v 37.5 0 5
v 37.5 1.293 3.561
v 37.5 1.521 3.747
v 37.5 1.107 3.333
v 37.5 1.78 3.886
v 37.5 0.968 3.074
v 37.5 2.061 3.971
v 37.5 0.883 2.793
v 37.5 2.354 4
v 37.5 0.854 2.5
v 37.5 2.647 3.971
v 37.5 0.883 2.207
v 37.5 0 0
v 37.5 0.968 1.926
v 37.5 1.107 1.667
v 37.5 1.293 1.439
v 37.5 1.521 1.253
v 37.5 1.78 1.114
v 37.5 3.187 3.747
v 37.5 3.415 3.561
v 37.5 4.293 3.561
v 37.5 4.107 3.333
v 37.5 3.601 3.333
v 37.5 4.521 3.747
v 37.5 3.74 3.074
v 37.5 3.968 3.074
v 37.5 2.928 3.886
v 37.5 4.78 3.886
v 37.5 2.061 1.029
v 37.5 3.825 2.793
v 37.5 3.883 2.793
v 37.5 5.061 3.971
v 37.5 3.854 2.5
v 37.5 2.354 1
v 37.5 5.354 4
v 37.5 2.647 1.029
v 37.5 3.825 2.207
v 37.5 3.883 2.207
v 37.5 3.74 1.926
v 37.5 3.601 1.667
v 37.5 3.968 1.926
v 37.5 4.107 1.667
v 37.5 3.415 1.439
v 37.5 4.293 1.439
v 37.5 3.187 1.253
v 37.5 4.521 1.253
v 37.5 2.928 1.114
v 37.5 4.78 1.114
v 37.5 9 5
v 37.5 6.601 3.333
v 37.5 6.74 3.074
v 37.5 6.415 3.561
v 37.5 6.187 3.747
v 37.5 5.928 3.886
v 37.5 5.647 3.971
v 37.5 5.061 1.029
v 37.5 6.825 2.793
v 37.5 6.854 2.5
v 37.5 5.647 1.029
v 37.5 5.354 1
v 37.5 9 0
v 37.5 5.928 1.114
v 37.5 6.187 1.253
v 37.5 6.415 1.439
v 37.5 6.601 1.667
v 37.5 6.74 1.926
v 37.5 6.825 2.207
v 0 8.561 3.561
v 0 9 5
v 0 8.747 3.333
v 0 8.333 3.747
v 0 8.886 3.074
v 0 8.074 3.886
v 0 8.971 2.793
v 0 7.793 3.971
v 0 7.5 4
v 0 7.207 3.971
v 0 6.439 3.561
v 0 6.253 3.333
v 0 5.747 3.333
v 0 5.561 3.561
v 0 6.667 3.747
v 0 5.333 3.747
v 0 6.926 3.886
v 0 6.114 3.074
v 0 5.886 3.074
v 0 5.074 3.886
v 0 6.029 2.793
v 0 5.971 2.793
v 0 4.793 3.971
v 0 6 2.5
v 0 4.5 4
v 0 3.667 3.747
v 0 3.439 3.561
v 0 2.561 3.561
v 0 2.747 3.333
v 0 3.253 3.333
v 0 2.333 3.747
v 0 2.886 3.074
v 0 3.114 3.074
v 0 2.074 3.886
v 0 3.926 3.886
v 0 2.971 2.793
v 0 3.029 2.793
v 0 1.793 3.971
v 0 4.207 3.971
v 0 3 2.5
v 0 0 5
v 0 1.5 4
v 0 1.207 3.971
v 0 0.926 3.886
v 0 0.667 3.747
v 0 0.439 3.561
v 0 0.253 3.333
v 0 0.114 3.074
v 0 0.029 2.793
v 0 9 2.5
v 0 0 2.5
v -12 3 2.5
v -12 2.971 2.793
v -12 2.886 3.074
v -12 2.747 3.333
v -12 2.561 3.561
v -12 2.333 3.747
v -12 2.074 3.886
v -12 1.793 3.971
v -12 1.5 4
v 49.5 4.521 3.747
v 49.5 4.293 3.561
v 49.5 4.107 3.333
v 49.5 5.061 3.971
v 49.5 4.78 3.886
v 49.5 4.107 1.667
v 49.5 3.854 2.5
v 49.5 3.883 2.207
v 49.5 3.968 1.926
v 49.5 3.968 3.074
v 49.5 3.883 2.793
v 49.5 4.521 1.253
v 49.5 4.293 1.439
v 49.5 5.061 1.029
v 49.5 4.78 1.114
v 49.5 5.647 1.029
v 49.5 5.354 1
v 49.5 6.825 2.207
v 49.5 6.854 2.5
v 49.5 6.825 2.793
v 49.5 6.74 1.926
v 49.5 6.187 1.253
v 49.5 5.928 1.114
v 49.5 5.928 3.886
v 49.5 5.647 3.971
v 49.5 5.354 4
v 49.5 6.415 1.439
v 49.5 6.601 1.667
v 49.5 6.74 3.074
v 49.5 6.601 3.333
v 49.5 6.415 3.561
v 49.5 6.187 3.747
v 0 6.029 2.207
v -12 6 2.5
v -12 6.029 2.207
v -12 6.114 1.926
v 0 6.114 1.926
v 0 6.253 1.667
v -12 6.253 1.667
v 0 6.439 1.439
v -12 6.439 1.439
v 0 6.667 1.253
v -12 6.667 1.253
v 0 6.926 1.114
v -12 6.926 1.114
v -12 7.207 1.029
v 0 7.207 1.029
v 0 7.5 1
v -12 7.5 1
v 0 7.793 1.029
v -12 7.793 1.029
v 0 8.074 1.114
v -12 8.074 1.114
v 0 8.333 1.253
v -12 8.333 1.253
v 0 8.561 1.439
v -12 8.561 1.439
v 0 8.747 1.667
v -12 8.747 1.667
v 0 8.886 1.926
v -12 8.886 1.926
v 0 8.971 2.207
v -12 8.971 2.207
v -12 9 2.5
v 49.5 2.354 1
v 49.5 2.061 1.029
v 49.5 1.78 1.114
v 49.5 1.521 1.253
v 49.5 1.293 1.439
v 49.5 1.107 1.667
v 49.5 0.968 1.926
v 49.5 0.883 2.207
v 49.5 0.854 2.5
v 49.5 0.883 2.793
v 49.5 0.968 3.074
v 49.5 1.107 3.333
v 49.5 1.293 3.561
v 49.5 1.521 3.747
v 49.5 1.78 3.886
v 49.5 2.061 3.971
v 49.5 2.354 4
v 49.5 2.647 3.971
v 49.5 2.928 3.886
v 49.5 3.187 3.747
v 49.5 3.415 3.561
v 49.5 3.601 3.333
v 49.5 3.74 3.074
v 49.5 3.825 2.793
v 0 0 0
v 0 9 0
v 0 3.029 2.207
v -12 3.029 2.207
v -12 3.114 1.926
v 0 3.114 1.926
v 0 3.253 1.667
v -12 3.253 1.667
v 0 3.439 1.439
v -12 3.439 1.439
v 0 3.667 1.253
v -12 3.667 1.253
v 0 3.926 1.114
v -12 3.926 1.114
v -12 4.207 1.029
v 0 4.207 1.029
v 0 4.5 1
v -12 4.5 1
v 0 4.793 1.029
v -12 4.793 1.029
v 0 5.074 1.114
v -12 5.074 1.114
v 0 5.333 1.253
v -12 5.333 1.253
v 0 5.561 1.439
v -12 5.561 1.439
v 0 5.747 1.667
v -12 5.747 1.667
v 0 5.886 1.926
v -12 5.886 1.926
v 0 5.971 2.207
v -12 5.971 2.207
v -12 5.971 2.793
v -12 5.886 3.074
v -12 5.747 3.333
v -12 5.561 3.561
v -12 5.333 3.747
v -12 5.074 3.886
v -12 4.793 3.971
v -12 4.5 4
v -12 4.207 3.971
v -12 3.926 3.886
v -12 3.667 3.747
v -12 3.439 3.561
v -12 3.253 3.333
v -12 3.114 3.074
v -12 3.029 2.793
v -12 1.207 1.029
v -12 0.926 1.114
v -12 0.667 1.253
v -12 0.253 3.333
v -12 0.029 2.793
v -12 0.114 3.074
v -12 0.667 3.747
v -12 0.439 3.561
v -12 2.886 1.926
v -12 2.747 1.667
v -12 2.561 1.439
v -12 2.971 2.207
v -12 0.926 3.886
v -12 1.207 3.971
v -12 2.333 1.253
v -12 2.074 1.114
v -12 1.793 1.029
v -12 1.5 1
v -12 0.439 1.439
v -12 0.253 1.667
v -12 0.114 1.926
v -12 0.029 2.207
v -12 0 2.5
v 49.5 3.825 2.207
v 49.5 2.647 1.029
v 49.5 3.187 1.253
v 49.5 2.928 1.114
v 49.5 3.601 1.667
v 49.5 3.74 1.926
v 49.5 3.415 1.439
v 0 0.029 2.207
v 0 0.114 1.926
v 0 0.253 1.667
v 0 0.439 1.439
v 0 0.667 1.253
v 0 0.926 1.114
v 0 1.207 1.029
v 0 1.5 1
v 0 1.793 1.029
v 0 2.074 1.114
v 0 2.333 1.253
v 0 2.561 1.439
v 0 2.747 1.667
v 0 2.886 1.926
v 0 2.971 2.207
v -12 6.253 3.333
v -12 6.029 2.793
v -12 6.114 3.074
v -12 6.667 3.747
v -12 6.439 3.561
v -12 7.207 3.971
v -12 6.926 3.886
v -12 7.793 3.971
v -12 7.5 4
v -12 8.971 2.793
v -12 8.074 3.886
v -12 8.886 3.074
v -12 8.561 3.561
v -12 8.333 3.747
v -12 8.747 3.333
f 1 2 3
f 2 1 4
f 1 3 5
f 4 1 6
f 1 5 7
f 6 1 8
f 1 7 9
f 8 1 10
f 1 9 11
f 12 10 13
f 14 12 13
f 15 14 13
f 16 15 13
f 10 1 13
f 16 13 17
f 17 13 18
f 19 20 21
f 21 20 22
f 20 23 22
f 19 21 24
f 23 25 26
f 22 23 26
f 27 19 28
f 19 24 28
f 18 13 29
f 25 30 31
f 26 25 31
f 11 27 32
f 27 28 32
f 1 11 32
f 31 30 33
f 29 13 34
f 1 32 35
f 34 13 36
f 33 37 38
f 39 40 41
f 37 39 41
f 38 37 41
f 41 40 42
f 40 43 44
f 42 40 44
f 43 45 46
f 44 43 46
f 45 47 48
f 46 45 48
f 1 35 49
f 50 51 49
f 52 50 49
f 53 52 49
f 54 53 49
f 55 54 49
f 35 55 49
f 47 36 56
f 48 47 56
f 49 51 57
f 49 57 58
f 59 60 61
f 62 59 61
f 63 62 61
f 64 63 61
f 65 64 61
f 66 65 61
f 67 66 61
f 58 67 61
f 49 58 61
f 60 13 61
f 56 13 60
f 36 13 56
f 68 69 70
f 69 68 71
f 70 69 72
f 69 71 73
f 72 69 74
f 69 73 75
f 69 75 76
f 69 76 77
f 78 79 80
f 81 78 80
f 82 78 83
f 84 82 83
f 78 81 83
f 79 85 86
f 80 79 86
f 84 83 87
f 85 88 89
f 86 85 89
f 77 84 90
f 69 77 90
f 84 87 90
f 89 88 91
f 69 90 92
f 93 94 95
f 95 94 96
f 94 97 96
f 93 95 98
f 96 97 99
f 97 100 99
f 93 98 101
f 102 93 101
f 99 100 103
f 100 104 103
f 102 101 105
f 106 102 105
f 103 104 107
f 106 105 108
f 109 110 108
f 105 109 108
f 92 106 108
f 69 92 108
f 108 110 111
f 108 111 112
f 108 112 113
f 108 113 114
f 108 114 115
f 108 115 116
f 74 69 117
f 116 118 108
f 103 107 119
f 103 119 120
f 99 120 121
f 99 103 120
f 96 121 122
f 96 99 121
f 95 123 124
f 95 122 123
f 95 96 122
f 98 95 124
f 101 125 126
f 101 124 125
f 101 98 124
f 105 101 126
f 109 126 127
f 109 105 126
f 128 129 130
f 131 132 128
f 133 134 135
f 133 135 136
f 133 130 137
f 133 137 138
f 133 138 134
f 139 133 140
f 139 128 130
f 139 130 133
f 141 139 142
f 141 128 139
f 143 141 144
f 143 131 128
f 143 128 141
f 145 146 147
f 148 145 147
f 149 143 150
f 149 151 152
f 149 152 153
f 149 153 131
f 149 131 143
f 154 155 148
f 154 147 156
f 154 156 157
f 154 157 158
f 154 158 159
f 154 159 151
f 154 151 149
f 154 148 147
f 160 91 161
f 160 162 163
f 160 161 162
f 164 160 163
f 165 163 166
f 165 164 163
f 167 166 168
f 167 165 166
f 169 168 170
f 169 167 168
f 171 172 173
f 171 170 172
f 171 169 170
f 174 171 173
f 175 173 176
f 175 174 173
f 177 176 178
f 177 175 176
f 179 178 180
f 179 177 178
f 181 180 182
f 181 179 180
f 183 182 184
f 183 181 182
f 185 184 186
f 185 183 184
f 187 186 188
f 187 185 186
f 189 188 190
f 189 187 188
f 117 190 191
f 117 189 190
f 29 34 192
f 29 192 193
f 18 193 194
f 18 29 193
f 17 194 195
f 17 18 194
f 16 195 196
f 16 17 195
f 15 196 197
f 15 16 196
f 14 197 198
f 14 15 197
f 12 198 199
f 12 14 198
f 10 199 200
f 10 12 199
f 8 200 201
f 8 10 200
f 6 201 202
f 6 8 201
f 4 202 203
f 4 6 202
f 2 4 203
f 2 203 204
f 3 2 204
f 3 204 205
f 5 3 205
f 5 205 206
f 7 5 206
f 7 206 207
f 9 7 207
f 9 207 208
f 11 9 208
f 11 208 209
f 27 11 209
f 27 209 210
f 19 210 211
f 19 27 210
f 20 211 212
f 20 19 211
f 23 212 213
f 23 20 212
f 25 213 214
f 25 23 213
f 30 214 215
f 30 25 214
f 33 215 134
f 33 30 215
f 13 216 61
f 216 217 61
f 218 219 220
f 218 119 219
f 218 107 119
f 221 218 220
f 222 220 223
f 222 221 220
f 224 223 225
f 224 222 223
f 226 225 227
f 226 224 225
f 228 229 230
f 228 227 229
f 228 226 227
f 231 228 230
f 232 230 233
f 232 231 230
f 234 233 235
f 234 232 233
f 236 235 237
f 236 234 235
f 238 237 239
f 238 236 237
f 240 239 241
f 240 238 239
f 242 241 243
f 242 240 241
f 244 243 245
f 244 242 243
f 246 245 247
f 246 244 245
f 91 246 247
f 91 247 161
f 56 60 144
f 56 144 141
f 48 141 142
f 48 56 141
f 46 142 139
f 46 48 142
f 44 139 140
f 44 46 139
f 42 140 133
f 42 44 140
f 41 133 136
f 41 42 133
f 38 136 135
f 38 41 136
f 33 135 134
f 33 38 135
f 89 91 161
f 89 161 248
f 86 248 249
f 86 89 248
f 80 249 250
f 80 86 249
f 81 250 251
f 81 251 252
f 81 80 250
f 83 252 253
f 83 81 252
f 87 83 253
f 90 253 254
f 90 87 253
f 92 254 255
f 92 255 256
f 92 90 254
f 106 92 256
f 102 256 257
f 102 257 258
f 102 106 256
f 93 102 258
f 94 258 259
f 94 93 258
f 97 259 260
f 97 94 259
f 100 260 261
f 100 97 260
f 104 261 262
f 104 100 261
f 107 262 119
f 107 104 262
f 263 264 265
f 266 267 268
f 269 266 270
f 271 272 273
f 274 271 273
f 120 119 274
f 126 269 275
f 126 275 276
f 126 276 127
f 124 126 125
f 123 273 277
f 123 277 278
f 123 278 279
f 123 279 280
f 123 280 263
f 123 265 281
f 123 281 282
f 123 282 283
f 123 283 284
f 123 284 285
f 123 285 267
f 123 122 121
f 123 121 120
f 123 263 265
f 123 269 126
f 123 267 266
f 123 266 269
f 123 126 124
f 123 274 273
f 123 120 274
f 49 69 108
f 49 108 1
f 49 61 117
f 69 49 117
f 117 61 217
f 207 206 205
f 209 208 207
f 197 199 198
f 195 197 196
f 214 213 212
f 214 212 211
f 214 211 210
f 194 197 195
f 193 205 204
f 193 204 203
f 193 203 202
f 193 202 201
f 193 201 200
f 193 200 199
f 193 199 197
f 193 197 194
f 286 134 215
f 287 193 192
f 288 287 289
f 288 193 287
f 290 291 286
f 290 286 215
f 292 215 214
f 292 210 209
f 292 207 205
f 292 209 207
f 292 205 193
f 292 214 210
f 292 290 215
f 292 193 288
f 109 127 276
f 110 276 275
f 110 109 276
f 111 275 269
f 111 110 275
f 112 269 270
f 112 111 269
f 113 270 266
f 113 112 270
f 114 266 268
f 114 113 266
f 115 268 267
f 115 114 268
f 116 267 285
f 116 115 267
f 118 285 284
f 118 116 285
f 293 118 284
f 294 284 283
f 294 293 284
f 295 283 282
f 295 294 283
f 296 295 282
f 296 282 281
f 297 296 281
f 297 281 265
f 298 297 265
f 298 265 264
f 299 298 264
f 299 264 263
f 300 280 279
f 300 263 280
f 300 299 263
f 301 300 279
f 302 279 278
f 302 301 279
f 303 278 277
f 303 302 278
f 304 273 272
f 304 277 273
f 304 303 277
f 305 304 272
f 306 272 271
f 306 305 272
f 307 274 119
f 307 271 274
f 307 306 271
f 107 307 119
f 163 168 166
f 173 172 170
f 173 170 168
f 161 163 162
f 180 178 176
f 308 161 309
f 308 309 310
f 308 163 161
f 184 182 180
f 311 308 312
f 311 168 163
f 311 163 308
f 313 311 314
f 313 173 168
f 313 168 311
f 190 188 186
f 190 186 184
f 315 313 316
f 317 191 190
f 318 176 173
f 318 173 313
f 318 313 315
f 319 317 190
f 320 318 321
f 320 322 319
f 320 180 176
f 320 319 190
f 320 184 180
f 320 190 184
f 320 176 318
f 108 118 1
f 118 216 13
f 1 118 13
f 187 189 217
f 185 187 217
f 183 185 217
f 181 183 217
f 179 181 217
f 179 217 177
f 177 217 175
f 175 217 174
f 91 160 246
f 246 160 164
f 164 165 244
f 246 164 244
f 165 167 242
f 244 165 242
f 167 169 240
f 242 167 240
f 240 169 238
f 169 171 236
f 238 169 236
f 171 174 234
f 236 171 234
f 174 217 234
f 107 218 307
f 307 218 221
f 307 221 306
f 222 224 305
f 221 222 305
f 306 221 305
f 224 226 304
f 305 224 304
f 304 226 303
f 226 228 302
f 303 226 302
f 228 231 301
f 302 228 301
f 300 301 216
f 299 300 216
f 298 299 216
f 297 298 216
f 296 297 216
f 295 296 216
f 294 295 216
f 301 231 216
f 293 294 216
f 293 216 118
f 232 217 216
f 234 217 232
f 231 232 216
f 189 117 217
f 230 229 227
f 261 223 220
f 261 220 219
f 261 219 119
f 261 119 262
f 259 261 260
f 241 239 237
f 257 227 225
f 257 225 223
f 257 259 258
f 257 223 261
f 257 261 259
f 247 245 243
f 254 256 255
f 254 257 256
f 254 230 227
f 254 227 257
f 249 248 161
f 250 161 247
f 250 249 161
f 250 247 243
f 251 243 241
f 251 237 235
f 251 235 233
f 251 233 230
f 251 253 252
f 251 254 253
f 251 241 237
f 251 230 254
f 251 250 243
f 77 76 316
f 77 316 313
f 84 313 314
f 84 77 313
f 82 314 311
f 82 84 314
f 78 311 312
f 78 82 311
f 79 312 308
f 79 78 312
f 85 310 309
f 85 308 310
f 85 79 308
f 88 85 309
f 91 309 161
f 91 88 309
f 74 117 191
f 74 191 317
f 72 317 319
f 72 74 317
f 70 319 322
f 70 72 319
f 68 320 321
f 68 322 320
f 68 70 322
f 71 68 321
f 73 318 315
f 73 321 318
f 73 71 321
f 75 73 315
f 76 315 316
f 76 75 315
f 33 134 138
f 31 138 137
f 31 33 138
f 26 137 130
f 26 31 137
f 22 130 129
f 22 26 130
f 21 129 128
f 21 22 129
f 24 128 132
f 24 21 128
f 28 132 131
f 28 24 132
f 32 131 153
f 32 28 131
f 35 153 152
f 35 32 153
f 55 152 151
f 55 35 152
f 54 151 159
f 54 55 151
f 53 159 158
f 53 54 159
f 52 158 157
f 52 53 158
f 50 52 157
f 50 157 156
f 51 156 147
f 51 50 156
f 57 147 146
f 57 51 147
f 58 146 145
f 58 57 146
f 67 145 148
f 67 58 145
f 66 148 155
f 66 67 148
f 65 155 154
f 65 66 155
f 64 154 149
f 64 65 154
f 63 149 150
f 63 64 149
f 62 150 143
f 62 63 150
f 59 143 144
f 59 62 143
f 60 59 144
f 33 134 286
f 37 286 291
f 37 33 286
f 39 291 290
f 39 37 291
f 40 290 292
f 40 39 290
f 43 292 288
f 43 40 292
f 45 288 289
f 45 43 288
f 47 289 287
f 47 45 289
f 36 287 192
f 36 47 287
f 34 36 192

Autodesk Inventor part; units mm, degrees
ref_plane "YZ Plane" through (0, 0, 0) normal (1, 0, 0) x (0, 1, 0)
ref_plane "XZ Plane" through (0, 0, 0) normal (0, 1, 0) x (-1, 0, 0)
ref_plane "XY Plane" through (0, 0, 0) normal (0, 0, 1) x (1, 0, 0)
sketch "Sketch1" plane through (0, 0, 0) normal (0, 0, 1) x (1, 0, 0)
  line L0 (0, 0) -> (37.5, 0)
  line L1 (37.5, 0) -> (37.5, 9)
  line L2 (37.5, 9) -> (0, 9)
  line L3 (0, 9) -> (0, 0)
  dimension "d0" = 37.5
  dimension "d1" = 9
extrude "Extrusion1" add sketch "Sketch1" along normal blind 5
sketch "Sketch2" plane through (37.5, 0, 0) normal (1, 0, 0) x (0, 0, -1)
  circle A0 centre (-2.5, 2.3541) radius 1.5
  circle A1 centre (-2.5, 5.3541) radius 1.5
  line L0 (0, 0) -> (-5, 0) projected
  line L1 (0, 9) -> (-5, 9) projected
  point P0 (-2.5, 0)
  dimension "d4" = 3
extrude "Extrusion2" add sketch "Sketch2" along normal blind 12
sketch "Sketch3" plane through (0, 0, 0) normal (-1, 0, 0) x (0, 0, 1)
  circle A0 centre (2.5, 7.5) radius 1.5
  circle A1 centre (2.5, 4.5) radius 1.5
  circle A2 centre (2.5, 1.5) radius 1.5
  line L0 (0, 9) -> (5, 9) projected
  line L1 (2.5, 7.5) -> (2.5, 9) construction
  line L2 (2.5, 1.5) -> (2.5, 0) construction
  line L3 (0, 0) -> (5, 0) construction
  dimension "d11" = 3
extrude "Extrusion3" add sketch "Sketch3" along normal blind 12
properties part number "ESC"
